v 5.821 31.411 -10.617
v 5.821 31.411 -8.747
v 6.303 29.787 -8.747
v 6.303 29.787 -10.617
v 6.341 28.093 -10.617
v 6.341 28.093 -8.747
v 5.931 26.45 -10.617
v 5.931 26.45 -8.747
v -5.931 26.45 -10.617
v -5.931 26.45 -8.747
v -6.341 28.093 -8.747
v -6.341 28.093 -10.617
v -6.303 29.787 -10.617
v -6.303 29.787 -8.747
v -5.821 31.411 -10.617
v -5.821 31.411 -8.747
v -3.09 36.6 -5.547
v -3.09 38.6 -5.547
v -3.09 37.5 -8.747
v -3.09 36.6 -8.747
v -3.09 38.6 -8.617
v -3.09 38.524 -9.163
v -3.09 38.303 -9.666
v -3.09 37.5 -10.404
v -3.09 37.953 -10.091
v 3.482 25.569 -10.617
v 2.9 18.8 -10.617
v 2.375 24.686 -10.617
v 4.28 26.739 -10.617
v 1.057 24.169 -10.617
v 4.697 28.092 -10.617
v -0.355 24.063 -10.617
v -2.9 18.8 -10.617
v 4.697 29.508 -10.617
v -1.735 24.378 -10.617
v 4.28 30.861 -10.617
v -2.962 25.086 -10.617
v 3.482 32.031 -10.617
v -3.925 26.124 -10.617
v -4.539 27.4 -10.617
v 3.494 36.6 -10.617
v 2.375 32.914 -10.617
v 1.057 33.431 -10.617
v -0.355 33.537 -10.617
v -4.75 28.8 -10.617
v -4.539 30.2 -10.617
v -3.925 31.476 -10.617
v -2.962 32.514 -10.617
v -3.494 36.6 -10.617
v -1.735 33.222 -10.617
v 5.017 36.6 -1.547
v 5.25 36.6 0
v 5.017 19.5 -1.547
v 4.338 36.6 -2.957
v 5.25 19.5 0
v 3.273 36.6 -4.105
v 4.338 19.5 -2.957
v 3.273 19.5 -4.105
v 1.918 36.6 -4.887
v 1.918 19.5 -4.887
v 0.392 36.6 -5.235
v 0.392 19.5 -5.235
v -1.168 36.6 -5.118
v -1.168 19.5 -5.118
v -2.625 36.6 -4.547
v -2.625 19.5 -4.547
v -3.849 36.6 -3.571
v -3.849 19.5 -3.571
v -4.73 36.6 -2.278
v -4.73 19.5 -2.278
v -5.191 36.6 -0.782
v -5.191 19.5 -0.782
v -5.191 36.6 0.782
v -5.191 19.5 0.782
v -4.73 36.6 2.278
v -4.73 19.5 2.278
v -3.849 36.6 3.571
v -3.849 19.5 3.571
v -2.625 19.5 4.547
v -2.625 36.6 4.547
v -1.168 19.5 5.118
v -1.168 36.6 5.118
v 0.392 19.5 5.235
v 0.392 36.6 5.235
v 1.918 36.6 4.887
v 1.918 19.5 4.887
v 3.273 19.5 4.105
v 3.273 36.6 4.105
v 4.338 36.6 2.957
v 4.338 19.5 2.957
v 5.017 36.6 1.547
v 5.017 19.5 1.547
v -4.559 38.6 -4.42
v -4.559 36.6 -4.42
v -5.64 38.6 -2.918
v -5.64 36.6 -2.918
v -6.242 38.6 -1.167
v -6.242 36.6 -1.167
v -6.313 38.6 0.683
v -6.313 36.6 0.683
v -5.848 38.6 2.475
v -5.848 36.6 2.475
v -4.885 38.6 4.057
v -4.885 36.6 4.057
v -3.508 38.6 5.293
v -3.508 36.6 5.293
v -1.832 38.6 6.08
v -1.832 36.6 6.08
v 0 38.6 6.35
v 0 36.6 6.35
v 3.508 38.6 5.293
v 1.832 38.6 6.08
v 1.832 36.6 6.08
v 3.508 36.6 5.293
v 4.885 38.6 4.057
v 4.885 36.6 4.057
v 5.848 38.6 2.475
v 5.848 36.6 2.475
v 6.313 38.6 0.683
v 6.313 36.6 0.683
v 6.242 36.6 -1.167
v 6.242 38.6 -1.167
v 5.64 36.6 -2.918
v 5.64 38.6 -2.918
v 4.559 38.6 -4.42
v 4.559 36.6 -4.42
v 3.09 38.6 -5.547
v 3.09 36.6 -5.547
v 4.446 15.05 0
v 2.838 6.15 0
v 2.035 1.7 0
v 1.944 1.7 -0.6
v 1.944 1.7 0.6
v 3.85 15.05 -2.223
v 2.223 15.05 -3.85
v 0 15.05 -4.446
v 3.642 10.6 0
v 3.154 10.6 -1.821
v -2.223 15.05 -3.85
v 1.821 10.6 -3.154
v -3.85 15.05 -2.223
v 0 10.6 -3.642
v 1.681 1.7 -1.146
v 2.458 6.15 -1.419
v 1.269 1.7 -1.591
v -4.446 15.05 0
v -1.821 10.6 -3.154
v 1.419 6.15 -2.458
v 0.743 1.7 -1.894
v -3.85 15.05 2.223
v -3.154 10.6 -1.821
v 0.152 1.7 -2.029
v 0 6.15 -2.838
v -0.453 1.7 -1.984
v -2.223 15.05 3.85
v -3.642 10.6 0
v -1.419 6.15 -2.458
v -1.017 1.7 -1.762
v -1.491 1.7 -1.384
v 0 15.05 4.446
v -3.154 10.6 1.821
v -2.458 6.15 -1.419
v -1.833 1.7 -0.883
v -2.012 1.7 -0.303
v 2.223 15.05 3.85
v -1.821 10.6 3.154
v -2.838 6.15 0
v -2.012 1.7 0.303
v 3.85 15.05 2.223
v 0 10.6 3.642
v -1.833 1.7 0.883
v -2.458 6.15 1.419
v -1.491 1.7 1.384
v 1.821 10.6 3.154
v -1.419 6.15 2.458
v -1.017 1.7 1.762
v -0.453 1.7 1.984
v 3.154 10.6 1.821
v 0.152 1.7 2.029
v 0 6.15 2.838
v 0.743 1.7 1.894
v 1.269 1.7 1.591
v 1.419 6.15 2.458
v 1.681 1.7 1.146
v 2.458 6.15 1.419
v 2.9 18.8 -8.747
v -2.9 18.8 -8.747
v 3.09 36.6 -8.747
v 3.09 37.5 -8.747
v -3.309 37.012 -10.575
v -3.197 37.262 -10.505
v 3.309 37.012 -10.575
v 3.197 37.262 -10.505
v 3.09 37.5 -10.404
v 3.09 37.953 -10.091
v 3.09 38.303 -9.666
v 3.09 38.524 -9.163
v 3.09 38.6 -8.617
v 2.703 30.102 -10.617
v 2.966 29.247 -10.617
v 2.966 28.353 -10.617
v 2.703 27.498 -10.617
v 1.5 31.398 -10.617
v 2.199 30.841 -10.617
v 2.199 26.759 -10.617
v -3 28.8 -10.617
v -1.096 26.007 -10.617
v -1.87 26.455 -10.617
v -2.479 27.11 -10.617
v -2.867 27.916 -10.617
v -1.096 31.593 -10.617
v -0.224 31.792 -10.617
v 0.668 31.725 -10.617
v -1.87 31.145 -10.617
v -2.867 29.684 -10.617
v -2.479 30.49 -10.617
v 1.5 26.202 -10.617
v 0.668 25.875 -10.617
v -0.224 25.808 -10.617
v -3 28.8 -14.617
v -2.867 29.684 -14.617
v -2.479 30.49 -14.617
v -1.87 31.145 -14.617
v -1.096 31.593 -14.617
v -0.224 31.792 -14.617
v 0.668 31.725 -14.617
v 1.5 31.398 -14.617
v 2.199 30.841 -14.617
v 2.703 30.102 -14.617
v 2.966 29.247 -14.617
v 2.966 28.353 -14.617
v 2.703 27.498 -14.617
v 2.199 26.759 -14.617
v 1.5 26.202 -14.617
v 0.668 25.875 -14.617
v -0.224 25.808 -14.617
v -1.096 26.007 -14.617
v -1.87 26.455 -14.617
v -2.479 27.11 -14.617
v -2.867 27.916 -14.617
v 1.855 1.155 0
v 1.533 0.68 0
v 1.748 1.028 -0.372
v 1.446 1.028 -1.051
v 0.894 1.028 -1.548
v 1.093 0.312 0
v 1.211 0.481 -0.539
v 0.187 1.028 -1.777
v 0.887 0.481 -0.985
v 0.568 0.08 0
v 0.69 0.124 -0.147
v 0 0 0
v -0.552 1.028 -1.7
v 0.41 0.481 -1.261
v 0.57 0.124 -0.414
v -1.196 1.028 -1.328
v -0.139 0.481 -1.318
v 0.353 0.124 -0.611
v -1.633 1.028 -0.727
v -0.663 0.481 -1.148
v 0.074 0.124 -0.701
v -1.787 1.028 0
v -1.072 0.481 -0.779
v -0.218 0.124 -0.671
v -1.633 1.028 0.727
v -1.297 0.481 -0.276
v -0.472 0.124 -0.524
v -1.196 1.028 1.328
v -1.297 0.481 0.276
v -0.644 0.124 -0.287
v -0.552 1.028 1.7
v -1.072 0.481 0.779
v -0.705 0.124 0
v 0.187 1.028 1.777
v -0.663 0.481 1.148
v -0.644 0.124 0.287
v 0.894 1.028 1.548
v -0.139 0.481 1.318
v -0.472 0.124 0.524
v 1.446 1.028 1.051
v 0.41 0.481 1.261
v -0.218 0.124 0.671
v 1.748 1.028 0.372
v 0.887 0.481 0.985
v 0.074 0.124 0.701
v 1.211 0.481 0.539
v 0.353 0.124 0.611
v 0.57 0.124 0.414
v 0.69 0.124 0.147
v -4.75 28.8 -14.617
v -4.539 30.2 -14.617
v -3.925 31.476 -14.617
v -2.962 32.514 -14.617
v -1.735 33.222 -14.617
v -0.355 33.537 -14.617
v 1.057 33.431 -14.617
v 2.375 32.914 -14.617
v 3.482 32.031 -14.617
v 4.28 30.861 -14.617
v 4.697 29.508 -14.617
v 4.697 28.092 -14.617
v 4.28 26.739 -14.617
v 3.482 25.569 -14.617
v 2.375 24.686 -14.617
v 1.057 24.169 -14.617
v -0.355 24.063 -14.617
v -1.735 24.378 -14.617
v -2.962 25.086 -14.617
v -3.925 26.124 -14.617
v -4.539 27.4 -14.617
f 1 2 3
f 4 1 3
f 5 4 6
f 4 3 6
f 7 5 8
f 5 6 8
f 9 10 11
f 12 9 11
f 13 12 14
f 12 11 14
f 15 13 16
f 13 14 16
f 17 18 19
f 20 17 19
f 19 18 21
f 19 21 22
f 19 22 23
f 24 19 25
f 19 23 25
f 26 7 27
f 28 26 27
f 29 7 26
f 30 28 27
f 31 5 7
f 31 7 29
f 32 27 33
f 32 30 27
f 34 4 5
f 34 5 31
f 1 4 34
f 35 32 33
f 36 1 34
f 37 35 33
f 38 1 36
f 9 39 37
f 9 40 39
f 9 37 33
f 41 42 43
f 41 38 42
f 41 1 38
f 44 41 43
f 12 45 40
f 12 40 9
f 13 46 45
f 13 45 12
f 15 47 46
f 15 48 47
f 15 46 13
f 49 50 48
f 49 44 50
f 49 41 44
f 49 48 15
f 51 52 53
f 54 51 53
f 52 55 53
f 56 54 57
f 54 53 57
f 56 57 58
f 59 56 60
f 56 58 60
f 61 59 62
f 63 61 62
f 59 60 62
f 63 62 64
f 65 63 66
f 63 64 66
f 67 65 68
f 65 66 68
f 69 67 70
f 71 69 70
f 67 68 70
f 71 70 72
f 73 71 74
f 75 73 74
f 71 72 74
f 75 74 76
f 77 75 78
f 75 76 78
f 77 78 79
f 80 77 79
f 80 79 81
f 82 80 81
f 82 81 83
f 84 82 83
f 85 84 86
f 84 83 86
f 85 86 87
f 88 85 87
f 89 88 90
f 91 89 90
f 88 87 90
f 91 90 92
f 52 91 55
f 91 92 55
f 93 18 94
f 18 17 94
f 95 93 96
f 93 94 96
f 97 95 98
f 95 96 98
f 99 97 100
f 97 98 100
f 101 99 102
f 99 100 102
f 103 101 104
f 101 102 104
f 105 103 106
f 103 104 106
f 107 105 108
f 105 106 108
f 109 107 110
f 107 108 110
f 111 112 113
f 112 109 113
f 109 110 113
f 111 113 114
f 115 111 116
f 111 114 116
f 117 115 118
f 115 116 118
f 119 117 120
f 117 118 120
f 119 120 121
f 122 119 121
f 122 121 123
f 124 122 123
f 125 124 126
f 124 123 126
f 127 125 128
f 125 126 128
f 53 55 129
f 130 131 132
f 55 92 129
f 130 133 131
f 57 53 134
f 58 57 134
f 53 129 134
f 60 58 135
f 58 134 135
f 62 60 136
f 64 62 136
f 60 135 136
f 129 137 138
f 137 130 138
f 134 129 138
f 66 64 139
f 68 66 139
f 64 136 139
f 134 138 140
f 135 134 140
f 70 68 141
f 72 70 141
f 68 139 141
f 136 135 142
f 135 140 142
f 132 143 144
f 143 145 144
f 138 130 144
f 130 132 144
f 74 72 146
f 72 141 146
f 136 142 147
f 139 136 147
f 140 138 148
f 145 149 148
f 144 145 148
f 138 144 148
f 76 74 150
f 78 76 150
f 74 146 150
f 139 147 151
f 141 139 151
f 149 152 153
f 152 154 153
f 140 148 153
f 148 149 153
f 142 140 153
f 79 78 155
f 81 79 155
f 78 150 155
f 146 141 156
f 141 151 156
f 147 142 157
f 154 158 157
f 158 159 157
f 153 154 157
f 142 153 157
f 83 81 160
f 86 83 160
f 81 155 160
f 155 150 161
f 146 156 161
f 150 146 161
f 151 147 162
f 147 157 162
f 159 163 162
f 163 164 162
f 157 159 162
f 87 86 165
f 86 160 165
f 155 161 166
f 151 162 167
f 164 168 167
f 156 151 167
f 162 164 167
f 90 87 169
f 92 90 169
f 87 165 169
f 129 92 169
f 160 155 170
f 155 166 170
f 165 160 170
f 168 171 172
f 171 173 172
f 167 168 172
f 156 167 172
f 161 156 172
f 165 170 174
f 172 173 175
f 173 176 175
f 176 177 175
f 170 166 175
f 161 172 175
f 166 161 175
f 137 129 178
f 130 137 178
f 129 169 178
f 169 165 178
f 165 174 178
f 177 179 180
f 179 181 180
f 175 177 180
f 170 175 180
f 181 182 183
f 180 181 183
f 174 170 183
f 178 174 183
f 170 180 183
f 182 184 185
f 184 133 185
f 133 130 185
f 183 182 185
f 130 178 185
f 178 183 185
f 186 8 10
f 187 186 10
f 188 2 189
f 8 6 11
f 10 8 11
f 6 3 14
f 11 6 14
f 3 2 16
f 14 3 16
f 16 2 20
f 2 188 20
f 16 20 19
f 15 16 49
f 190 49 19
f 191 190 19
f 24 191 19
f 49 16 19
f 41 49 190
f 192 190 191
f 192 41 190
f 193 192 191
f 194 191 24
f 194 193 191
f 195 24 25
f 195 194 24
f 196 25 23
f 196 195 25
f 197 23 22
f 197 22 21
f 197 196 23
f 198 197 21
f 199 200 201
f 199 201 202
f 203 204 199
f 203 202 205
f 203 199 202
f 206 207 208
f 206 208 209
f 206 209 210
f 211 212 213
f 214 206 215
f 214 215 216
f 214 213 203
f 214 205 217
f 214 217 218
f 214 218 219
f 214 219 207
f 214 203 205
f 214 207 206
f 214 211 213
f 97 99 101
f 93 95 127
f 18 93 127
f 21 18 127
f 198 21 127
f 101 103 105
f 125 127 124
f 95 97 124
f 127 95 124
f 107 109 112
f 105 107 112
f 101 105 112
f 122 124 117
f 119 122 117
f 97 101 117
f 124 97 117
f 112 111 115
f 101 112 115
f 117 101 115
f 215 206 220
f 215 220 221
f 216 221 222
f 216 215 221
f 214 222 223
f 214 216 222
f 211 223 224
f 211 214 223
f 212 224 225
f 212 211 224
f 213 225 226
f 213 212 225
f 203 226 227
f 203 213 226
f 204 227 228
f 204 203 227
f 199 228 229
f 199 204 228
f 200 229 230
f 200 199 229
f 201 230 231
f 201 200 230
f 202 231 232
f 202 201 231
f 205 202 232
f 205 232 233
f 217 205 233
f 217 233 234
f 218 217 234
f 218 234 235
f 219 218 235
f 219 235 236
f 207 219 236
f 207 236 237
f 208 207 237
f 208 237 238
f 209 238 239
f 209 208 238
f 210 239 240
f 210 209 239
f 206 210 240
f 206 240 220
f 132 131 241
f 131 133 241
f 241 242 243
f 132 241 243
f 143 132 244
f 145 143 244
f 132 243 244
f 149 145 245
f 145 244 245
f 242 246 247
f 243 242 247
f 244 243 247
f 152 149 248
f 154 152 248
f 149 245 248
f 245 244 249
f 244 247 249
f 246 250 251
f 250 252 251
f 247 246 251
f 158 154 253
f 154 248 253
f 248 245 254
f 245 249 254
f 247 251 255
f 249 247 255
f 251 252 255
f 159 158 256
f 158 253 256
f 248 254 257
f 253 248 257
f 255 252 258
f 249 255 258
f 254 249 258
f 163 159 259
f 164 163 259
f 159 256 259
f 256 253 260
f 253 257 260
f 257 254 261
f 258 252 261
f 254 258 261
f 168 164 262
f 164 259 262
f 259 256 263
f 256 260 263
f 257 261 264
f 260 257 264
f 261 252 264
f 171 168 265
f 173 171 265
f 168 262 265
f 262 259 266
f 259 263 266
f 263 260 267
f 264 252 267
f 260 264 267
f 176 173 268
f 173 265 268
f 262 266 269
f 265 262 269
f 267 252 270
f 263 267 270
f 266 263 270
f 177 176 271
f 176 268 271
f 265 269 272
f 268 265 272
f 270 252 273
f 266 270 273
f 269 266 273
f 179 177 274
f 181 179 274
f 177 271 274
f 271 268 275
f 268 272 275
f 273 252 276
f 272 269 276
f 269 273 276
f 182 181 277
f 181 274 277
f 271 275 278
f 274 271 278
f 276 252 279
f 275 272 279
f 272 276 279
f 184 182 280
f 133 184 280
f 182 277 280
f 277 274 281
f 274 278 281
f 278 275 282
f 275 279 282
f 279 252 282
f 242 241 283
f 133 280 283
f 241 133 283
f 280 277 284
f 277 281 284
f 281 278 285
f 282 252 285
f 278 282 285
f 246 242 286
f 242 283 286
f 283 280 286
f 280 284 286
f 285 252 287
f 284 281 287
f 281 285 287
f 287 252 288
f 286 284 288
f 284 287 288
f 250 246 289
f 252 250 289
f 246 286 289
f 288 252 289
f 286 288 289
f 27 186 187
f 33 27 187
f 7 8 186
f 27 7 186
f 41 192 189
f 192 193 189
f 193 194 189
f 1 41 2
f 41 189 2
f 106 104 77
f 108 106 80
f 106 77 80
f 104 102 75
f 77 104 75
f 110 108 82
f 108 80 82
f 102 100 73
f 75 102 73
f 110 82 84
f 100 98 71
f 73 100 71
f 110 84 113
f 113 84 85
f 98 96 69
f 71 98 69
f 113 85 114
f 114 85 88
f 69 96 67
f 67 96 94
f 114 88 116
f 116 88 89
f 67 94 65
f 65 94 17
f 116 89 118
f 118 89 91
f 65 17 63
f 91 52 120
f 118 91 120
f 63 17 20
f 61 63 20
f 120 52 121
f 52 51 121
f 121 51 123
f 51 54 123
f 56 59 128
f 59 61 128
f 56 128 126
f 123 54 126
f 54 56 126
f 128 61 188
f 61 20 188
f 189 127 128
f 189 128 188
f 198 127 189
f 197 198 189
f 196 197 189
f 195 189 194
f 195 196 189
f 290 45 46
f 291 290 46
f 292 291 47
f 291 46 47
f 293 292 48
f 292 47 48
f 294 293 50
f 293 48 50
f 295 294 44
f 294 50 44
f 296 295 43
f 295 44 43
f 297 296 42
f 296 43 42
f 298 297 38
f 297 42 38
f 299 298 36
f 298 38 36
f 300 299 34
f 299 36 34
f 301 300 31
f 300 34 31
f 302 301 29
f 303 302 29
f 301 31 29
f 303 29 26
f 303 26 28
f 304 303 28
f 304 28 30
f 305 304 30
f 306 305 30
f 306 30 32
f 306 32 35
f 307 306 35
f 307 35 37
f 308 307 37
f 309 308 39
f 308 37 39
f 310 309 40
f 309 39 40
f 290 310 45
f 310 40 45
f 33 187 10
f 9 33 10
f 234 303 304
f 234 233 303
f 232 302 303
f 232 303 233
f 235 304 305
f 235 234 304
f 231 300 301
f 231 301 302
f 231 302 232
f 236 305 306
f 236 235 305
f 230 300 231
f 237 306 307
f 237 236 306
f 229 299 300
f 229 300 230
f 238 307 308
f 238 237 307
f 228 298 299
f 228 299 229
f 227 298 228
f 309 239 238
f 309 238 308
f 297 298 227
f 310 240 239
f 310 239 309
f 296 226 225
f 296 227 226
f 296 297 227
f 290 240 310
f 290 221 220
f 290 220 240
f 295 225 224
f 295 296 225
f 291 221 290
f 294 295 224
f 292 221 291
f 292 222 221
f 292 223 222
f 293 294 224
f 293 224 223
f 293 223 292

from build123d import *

# Parameters (mm, degrees)
SKETCH2_W           = 6.18
SKETCH2_H           = 3.2
BOSS_EXTRUDE1_DEPTH = 2
BOSS_EXTRUDE2_DEPTH = 1.87
SKETCH4_R           = 4.75
SKETCH4_R_2         = 3
BOSS_EXTRUDE3_DEPTH = 4
FILLET1_R           = 2


with BuildPart() as part:
    # Sketch1 → Revolve1 (revolve)
    with BuildSketch(Plane.XY):
        with BuildLine():
            Line((5.25, 36.6), (5.25, 19.5))
            Line((5.25, 19.5), (2.034602195, 1.7))
            ThreePointArc((2.034602195, 1.7), (1.325670217, 0.480936184), (0, 0))
            Line((0, 0), (0, 38.6))
            Line((0, 38.6), (6.35, 38.6))
            Line((6.35, 38.6), (6.35, 36.6))
            Line((6.35, 36.6), (5.25, 36.6))
        make_face()
    revolve(axis=Axis((0, 0, 0), (0, 1, 0)))

    # Sketch2 → Boss-Extrude1 (add)
    with BuildSketch(Plane(origin=(0, 38.6, 0), x_dir=(1, 0, 0), z_dir=(0, 1, 0))):
        with Locations((0, 7.147467891)):
            Rectangle(SKETCH2_W, SKETCH2_H)
    extrude(amount=-BOSS_EXTRUDE1_DEPTH)

    # Sketch3 → Boss-Extrude2 (add)
    with BuildSketch(Plane(origin=(0, 0, -8.747467891), x_dir=(-1, 0, 0), z_dir=(0, 0, -1))):
        with BuildLine():
            Line((-2.9, 18.8), (2.9, 18.8))
            Line((2.9, 18.8), (5.931288007, 26.449633522))
            ThreePointArc((5.931288007, 26.449633522), (6.37843004, 28.941528165), (5.821199394, 31.411137227))
            Line((5.821199394, 31.411137227), (3.09, 37.5))
            Line((3.09, 37.5), (3.09, 38.6))
            Line((3.09, 38.6), (-3.09, 38.6))
            Line((-3.09, 38.6), (-3.09, 37.5))
            Line((-3.09, 37.5), (-5.821199394, 31.411137227))
            ThreePointArc((-5.821199394, 31.411137227), (-6.37843004, 28.941528165), (-5.931288007, 26.449633522))
            Line((-5.931288007, 26.449633522), (-2.9, 18.8))
        make_face()
    extrude(amount=BOSS_EXTRUDE2_DEPTH)

    # Sketch4 → Boss-Extrude3 (add)
    with BuildSketch(Plane(origin=(0, 0, -10.617467891), x_dir=(-1, 0, 0), z_dir=(0, 0, -1))):
        with Locations((0, 28.8)):
            Circle(SKETCH4_R)
        with Locations((0, 28.8)):
            Circle(SKETCH4_R_2, mode=Mode.SUBTRACT)
    extrude(amount=BOSS_EXTRUDE3_DEPTH)

    # Fillet1
    fillet1_edges = [part.edges().sort_by_distance(p)[0] for p in [
        (0, 38.6, -10.617467891),
    ]]
    fillet(fillet1_edges, radius=FILLET1_R)


solid = part.part
